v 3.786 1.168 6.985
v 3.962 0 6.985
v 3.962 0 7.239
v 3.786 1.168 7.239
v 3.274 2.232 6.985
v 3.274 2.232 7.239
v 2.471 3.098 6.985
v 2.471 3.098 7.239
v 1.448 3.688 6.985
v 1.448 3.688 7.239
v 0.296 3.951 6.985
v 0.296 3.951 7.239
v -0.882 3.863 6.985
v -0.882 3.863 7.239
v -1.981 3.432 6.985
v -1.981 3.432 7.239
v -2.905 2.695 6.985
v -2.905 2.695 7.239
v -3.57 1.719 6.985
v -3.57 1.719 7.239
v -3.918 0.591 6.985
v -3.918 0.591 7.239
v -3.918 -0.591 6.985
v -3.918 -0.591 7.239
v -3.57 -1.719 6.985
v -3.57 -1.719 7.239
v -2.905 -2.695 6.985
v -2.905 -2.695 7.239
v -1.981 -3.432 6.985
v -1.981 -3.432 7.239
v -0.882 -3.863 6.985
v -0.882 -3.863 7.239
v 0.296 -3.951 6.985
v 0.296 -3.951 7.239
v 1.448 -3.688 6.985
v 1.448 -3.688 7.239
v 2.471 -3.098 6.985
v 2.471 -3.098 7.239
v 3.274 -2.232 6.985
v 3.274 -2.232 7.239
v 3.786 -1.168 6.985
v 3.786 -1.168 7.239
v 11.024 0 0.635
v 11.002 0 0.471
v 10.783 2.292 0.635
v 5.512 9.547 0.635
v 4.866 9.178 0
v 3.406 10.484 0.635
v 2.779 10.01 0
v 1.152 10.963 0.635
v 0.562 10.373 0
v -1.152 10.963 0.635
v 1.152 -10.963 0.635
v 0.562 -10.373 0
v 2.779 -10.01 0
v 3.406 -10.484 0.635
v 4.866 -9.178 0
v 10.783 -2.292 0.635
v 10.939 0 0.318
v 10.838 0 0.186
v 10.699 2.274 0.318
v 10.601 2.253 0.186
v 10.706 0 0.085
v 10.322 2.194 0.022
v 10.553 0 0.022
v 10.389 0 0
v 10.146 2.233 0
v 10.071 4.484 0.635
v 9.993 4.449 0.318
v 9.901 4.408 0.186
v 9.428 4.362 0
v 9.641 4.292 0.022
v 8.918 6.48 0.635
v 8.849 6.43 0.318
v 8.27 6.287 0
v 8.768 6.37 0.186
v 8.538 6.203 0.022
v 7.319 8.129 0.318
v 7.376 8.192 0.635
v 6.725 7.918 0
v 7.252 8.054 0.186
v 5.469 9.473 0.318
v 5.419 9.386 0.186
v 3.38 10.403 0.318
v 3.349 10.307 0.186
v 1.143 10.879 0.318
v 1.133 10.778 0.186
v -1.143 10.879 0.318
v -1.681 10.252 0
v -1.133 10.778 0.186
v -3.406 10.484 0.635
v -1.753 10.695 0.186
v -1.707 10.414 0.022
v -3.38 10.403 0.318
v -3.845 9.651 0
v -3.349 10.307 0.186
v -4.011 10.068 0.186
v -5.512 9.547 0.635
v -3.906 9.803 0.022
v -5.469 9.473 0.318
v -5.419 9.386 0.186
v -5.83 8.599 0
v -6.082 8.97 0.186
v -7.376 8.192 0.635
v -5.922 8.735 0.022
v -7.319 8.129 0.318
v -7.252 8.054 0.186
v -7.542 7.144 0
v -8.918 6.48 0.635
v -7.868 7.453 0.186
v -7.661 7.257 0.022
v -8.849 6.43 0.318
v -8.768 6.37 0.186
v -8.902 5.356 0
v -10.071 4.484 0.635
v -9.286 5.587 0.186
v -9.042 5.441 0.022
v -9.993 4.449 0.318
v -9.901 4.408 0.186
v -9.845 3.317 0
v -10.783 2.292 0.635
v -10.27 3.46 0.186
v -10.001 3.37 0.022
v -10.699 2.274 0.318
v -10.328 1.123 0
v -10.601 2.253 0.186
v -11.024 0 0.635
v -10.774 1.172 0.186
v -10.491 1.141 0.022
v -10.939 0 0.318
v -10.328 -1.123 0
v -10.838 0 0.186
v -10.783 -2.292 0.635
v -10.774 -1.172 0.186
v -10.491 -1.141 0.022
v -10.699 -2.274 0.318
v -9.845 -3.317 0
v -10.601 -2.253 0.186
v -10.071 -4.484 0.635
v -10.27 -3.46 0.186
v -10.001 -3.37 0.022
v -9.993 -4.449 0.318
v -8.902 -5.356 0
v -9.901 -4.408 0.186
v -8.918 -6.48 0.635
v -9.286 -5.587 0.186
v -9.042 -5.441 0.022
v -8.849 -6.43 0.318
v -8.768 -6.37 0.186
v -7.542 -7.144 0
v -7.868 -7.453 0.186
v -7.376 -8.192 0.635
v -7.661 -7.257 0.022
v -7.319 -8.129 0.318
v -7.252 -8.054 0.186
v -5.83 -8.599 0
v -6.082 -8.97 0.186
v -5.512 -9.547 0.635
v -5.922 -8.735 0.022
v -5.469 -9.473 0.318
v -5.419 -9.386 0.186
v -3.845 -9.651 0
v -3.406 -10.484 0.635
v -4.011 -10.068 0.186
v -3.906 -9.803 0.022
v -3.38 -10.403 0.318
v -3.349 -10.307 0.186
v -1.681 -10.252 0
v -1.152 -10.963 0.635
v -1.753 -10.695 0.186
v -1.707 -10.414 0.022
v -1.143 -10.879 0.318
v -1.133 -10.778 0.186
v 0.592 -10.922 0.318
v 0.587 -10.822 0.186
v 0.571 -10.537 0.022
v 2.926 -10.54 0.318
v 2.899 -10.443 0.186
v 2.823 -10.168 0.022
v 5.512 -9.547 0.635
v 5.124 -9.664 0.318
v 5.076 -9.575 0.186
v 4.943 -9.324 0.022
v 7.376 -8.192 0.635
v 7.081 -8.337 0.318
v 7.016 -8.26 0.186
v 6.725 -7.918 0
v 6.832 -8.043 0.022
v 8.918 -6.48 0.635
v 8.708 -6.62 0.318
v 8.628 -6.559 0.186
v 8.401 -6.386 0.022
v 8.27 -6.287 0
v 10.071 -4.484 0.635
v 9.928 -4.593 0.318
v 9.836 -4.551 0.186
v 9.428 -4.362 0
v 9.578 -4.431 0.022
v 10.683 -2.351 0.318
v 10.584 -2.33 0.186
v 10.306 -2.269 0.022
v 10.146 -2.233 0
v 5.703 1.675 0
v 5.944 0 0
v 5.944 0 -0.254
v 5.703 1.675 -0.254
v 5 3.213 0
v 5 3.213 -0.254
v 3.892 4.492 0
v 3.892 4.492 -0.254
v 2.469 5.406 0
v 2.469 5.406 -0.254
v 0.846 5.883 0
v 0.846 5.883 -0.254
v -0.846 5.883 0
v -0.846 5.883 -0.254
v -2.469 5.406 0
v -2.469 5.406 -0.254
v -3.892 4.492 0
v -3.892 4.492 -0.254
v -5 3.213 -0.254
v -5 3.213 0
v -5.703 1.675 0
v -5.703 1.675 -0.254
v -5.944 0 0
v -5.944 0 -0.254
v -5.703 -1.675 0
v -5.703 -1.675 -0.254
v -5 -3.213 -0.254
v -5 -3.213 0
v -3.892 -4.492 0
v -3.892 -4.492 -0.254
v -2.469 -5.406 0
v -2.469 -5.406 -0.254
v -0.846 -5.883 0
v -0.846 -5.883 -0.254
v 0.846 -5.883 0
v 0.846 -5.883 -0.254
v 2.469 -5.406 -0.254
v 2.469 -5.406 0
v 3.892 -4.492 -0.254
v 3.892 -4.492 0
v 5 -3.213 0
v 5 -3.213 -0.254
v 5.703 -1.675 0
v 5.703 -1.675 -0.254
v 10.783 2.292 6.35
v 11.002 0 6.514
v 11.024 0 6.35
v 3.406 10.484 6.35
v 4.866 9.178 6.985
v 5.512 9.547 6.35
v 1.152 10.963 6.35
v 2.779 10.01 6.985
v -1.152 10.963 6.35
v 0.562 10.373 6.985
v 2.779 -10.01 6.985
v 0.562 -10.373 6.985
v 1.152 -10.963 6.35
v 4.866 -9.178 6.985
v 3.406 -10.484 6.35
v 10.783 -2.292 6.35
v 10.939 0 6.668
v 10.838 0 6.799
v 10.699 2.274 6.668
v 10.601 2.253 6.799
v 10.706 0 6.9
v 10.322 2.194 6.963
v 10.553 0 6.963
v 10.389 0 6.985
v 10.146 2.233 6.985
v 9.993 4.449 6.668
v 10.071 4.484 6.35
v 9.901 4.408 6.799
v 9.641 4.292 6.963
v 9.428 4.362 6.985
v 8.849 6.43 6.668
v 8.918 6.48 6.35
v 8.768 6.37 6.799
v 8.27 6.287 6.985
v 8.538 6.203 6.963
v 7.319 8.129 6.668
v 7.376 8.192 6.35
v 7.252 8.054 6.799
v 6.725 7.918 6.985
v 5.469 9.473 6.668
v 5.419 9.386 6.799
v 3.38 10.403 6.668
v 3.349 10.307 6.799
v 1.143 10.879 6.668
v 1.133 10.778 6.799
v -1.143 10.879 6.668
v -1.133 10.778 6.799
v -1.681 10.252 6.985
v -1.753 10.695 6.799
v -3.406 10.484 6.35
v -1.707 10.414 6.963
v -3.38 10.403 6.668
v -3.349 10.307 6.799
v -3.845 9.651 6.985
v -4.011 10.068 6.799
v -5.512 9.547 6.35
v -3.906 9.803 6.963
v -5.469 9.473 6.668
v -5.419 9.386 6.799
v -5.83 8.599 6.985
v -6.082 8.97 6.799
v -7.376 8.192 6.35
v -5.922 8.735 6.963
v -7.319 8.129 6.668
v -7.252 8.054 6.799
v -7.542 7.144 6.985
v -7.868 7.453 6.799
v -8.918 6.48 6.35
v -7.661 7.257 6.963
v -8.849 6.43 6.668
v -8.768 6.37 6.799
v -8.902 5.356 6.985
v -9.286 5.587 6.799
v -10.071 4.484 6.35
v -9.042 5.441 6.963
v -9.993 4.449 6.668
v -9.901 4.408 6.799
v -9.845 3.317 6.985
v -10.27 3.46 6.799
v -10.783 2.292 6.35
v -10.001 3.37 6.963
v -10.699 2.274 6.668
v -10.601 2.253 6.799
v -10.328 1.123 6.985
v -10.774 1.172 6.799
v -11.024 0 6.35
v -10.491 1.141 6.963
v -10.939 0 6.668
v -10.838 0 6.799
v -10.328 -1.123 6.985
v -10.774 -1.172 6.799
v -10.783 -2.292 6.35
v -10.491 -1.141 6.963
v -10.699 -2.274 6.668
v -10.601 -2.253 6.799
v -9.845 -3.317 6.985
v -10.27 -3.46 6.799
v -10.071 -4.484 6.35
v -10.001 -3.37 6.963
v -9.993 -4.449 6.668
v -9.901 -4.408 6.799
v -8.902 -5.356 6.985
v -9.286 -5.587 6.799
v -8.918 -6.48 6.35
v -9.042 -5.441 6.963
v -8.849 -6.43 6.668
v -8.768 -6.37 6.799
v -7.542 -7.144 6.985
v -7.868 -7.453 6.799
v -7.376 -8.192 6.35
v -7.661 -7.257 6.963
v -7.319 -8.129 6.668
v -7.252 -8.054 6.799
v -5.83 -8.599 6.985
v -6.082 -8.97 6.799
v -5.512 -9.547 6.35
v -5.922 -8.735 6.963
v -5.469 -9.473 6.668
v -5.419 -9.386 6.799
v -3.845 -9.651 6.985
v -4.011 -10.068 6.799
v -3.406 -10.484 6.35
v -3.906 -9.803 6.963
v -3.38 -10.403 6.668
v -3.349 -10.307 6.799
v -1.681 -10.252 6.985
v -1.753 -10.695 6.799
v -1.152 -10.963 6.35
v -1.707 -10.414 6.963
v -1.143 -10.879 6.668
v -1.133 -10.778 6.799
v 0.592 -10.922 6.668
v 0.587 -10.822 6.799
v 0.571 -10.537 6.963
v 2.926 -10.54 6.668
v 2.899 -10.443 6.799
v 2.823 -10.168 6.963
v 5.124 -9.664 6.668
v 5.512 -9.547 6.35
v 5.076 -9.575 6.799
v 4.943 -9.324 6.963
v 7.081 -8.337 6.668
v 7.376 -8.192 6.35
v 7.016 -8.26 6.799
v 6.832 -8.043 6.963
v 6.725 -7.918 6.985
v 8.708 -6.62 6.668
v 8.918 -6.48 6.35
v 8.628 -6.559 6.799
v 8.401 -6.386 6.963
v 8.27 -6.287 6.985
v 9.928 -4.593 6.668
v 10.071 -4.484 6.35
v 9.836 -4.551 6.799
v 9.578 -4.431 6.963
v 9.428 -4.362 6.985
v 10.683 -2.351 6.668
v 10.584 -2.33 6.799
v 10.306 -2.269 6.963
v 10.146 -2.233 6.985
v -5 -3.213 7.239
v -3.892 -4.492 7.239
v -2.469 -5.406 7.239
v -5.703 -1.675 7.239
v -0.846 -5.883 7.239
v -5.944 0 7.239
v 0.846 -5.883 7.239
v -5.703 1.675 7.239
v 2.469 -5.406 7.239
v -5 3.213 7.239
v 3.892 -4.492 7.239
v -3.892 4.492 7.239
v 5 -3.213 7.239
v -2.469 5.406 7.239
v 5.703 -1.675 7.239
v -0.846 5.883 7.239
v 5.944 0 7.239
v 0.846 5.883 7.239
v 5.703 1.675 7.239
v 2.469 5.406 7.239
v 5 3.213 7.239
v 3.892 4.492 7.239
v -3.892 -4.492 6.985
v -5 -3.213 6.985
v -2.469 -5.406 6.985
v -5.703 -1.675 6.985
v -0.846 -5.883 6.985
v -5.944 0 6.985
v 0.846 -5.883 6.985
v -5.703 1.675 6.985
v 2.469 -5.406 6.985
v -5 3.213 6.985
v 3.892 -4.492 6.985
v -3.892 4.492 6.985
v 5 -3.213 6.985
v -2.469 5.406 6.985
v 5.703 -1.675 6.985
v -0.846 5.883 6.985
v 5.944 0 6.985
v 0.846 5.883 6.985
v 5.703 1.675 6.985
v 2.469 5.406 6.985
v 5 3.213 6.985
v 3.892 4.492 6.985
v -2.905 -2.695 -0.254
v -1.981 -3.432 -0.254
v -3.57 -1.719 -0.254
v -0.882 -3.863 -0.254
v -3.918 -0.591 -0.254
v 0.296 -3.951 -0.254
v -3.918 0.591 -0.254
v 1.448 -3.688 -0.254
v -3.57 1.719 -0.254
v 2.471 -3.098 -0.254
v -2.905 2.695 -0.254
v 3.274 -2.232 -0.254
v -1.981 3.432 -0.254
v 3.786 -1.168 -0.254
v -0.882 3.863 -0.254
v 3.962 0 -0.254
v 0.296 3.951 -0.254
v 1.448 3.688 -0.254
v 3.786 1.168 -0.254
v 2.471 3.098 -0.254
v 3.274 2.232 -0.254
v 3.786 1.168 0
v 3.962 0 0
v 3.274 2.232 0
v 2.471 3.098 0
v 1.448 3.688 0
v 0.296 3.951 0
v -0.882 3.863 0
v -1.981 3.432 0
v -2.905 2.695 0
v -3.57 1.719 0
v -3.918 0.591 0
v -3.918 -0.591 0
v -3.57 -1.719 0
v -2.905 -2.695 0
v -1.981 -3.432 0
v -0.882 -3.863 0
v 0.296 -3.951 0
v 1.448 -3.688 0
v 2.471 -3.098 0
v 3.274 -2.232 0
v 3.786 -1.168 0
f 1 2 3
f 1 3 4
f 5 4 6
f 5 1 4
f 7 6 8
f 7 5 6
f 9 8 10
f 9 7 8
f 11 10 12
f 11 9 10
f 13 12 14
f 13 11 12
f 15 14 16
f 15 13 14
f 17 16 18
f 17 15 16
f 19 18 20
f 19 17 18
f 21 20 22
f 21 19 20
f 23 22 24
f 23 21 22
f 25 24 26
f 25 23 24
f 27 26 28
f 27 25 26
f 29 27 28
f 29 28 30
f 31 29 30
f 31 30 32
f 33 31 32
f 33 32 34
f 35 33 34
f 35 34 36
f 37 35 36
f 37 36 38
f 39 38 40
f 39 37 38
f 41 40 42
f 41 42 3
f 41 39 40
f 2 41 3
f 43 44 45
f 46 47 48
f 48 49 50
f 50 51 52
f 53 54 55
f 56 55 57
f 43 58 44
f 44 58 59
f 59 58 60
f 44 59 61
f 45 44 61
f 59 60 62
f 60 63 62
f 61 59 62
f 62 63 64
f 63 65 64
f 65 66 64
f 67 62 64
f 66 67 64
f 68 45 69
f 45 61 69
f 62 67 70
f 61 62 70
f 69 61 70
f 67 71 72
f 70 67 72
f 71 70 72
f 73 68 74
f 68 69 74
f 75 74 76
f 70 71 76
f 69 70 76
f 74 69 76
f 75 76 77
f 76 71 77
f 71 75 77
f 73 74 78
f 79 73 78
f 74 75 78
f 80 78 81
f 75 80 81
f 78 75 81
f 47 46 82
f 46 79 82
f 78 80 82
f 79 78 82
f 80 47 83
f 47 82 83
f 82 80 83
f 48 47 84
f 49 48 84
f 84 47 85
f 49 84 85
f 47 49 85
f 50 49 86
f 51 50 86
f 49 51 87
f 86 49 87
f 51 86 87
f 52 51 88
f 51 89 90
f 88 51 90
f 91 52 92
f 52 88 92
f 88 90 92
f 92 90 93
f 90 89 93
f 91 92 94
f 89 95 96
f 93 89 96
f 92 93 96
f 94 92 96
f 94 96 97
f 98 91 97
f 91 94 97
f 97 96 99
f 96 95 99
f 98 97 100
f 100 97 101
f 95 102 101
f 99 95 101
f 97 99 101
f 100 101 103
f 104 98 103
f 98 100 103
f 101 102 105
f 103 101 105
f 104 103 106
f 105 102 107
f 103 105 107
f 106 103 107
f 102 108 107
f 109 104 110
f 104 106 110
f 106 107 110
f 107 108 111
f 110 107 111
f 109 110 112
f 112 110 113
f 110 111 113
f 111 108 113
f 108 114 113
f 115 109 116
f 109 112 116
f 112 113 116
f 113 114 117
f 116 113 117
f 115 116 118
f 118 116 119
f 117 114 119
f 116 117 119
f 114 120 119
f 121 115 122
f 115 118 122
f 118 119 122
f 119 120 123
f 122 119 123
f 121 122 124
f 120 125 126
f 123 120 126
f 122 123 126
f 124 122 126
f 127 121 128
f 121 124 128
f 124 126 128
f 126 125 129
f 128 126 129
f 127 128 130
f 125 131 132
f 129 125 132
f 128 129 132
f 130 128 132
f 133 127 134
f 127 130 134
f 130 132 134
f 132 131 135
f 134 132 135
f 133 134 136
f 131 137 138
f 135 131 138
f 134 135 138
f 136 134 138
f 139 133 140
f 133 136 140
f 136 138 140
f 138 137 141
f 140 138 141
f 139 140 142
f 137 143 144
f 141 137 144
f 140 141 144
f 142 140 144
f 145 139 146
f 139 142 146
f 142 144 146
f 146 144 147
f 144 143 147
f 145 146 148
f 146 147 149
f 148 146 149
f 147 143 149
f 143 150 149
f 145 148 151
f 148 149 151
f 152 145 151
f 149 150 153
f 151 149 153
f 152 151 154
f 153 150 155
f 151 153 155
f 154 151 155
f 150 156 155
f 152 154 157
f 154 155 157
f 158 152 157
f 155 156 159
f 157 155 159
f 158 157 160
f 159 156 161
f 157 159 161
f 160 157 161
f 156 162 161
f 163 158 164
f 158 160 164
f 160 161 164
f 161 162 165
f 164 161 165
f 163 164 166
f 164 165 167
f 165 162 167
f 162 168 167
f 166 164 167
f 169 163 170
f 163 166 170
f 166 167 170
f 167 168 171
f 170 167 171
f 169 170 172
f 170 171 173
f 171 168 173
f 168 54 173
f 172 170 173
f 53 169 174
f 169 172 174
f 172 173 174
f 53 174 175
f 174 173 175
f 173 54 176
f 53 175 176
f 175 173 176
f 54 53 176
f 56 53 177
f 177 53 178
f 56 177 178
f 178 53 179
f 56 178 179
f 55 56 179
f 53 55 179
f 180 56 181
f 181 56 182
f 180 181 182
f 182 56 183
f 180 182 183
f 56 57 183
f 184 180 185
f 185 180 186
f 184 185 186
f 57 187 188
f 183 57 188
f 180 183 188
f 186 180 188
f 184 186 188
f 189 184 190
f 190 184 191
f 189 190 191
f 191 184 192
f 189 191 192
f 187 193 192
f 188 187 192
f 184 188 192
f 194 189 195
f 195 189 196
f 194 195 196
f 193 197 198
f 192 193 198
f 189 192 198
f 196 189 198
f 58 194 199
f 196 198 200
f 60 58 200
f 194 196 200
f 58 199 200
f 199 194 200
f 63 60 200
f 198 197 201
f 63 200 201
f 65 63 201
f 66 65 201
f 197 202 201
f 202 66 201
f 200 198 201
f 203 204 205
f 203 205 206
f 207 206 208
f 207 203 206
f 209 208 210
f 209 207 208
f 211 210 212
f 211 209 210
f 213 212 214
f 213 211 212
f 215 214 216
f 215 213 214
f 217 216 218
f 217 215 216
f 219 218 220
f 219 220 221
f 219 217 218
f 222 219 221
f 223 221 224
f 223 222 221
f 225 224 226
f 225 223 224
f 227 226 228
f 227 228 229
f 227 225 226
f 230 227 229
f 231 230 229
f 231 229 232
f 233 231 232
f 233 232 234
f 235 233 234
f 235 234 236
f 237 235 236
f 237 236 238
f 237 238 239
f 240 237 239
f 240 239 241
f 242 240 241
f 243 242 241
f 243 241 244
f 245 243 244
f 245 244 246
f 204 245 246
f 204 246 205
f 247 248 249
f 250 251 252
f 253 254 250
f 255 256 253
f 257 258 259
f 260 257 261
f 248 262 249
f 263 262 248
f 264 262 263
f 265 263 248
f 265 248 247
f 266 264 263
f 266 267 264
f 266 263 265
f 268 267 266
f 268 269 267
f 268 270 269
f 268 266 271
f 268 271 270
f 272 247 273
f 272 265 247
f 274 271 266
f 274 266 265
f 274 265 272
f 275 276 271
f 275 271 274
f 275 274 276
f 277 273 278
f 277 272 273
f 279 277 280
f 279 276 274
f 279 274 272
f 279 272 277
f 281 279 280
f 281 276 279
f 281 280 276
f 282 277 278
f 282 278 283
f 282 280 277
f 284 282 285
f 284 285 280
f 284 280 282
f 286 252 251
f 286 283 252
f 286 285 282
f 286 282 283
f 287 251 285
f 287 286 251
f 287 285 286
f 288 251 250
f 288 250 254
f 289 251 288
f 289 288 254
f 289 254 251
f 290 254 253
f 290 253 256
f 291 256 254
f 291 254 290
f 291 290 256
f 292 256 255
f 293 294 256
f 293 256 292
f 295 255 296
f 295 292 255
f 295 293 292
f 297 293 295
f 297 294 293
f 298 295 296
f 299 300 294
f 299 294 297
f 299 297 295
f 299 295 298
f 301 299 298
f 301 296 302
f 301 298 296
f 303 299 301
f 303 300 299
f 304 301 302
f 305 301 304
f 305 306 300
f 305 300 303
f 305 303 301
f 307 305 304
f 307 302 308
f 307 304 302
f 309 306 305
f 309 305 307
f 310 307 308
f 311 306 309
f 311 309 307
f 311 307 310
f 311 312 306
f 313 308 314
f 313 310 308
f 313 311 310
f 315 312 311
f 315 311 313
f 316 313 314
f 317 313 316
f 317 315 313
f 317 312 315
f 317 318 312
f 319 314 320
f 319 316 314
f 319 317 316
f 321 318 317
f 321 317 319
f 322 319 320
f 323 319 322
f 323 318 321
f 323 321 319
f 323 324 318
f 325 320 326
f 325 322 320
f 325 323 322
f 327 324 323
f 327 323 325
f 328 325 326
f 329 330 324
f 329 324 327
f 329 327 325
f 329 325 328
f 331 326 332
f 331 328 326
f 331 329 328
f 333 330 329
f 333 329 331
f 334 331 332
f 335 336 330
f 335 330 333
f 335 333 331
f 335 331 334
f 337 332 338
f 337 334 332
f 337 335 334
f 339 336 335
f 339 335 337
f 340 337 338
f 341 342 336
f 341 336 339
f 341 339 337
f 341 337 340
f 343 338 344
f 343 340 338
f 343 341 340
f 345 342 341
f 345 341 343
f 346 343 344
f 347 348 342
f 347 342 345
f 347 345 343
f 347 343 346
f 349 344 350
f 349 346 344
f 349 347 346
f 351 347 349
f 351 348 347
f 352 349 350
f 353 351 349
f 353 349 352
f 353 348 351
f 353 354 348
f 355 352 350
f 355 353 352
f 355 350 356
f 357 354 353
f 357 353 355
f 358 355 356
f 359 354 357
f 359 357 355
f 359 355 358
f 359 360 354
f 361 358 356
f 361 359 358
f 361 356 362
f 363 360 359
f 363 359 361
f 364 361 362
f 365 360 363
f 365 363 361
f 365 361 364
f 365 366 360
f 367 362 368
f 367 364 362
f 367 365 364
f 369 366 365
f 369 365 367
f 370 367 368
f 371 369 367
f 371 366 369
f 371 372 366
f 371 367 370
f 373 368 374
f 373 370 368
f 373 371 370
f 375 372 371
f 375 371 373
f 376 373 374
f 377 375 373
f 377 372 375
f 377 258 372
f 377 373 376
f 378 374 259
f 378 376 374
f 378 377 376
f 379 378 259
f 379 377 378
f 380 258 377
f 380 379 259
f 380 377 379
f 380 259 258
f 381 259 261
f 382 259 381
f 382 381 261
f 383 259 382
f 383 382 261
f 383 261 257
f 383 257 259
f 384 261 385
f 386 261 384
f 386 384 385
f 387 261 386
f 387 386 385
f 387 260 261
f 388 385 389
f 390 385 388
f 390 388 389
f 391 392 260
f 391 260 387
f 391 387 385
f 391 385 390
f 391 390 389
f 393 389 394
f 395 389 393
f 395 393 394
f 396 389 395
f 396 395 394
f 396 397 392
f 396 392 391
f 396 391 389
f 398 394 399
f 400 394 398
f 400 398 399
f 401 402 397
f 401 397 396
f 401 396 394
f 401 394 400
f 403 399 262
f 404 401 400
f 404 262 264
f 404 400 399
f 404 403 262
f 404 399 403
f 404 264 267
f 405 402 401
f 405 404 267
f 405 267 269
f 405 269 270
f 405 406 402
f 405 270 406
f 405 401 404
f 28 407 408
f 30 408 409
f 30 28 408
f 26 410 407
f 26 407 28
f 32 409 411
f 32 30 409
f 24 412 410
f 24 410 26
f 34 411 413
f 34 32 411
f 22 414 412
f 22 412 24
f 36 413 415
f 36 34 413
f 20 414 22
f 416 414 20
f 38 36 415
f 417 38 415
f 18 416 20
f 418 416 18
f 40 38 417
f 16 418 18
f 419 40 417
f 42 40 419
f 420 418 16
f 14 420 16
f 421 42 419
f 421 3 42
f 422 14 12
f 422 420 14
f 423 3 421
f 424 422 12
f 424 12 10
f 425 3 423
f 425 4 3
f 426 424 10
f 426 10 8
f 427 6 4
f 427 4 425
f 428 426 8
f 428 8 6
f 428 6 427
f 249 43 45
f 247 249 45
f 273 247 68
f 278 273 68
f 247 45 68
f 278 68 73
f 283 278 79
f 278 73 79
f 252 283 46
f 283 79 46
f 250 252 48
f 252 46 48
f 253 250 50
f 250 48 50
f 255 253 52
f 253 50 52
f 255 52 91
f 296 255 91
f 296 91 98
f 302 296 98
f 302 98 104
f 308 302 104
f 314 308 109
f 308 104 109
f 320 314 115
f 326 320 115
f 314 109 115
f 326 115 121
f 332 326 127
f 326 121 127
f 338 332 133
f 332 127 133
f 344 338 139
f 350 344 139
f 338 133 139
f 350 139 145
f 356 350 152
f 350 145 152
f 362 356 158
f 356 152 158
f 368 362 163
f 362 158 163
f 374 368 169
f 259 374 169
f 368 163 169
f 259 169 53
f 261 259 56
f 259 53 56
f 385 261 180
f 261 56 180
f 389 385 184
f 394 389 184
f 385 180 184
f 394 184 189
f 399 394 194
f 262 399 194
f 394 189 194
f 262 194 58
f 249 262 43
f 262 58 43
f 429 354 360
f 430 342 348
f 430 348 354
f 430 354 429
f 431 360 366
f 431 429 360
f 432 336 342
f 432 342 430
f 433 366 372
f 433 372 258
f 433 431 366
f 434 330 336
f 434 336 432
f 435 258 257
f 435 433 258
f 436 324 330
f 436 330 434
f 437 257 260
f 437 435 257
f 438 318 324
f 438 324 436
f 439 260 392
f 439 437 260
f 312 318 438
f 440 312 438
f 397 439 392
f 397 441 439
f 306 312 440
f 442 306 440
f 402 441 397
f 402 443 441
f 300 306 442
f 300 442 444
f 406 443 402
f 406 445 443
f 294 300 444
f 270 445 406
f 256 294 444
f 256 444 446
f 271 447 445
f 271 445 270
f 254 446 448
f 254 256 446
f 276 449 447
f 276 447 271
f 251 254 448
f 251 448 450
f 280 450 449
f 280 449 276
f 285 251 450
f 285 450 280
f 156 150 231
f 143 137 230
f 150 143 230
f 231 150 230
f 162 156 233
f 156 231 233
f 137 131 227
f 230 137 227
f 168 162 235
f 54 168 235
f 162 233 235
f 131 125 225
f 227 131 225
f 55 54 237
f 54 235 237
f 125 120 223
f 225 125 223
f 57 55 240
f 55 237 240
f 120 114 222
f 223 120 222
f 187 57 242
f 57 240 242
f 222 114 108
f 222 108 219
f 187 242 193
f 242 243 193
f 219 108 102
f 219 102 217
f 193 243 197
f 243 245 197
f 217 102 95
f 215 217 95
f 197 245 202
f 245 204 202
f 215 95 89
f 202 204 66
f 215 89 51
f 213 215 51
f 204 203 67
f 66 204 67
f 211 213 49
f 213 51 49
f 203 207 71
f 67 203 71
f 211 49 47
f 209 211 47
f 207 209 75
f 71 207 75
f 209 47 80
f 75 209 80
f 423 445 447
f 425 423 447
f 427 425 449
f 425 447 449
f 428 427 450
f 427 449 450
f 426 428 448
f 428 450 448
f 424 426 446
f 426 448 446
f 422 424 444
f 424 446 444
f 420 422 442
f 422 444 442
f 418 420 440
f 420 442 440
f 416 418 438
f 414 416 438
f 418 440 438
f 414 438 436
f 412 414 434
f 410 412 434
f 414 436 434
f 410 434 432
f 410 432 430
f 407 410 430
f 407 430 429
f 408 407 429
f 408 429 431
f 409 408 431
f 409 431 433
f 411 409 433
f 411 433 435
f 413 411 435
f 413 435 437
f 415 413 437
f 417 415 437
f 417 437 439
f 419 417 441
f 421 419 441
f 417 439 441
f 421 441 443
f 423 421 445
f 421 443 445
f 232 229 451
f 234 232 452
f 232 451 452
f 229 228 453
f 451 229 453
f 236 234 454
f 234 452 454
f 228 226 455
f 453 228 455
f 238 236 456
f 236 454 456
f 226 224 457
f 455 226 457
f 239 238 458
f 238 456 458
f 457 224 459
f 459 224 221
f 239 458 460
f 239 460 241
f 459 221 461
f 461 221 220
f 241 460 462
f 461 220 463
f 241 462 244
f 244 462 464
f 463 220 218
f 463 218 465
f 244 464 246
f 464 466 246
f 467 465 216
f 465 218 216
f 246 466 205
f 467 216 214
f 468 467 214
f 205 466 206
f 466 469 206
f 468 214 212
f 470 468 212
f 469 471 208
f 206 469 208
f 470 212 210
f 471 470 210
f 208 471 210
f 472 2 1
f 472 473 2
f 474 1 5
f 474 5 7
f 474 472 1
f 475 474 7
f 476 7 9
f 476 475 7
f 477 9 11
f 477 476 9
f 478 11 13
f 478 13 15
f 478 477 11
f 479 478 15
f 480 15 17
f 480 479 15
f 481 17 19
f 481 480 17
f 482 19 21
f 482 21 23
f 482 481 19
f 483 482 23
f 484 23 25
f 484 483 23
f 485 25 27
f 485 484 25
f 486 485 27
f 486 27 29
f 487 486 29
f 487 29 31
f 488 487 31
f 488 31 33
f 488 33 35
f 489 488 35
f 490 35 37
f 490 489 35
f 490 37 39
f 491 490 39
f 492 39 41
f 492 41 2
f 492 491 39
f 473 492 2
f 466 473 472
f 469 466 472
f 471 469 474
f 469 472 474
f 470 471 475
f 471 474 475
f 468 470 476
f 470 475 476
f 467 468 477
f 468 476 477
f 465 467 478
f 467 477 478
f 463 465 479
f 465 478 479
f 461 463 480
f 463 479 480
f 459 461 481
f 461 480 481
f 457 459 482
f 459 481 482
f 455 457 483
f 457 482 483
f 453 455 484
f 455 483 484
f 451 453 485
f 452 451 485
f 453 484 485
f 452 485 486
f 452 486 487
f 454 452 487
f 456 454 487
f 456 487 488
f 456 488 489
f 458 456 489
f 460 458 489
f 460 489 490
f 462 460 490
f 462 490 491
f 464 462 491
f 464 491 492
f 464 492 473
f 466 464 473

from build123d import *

# Parameters (mm, degrees)
F0_R          = 11.0236
F0_R_2        = 5.842
F0_R_3        = 3.9624
F1_DEPTH      = 6.985
F2_R          = 0.635
F3_R          = 5.9436
F3_R_2        = 3.9624
F4_DEPTH      = 0.254
F4_DEPTH_BACK = 7.239


with BuildPart() as f1:
    # F0 (on Top) → F1 (new body)
    with BuildSketch(Plane.XY):
        Circle(F0_R)
        Circle(F0_R_2, mode=Mode.SUBTRACT)
        Circle(F0_R_2)
        Circle(F0_R_3, mode=Mode.SUBTRACT)
    extrude(amount=F1_DEPTH)

    # F2
    f2_edges = [f1.edges().sort_by_distance(p)[0] for p in [
        (-11.0236, 0, 0),
        (-11.0236, 0, 6.985),
    ]]
    fillet(f2_edges, radius=F2_R)

    # F3 (on face) → F4 (join, two sides)
    with BuildSketch(Plane.XY.offset(6.985)) as f4_sk:
        Circle(F3_R)
        Circle(F3_R_2, mode=Mode.SUBTRACT)
    extrude(amount=F4_DEPTH)
    extrude(f4_sk.sketch, amount=-F4_DEPTH_BACK)


solid = f1.part
